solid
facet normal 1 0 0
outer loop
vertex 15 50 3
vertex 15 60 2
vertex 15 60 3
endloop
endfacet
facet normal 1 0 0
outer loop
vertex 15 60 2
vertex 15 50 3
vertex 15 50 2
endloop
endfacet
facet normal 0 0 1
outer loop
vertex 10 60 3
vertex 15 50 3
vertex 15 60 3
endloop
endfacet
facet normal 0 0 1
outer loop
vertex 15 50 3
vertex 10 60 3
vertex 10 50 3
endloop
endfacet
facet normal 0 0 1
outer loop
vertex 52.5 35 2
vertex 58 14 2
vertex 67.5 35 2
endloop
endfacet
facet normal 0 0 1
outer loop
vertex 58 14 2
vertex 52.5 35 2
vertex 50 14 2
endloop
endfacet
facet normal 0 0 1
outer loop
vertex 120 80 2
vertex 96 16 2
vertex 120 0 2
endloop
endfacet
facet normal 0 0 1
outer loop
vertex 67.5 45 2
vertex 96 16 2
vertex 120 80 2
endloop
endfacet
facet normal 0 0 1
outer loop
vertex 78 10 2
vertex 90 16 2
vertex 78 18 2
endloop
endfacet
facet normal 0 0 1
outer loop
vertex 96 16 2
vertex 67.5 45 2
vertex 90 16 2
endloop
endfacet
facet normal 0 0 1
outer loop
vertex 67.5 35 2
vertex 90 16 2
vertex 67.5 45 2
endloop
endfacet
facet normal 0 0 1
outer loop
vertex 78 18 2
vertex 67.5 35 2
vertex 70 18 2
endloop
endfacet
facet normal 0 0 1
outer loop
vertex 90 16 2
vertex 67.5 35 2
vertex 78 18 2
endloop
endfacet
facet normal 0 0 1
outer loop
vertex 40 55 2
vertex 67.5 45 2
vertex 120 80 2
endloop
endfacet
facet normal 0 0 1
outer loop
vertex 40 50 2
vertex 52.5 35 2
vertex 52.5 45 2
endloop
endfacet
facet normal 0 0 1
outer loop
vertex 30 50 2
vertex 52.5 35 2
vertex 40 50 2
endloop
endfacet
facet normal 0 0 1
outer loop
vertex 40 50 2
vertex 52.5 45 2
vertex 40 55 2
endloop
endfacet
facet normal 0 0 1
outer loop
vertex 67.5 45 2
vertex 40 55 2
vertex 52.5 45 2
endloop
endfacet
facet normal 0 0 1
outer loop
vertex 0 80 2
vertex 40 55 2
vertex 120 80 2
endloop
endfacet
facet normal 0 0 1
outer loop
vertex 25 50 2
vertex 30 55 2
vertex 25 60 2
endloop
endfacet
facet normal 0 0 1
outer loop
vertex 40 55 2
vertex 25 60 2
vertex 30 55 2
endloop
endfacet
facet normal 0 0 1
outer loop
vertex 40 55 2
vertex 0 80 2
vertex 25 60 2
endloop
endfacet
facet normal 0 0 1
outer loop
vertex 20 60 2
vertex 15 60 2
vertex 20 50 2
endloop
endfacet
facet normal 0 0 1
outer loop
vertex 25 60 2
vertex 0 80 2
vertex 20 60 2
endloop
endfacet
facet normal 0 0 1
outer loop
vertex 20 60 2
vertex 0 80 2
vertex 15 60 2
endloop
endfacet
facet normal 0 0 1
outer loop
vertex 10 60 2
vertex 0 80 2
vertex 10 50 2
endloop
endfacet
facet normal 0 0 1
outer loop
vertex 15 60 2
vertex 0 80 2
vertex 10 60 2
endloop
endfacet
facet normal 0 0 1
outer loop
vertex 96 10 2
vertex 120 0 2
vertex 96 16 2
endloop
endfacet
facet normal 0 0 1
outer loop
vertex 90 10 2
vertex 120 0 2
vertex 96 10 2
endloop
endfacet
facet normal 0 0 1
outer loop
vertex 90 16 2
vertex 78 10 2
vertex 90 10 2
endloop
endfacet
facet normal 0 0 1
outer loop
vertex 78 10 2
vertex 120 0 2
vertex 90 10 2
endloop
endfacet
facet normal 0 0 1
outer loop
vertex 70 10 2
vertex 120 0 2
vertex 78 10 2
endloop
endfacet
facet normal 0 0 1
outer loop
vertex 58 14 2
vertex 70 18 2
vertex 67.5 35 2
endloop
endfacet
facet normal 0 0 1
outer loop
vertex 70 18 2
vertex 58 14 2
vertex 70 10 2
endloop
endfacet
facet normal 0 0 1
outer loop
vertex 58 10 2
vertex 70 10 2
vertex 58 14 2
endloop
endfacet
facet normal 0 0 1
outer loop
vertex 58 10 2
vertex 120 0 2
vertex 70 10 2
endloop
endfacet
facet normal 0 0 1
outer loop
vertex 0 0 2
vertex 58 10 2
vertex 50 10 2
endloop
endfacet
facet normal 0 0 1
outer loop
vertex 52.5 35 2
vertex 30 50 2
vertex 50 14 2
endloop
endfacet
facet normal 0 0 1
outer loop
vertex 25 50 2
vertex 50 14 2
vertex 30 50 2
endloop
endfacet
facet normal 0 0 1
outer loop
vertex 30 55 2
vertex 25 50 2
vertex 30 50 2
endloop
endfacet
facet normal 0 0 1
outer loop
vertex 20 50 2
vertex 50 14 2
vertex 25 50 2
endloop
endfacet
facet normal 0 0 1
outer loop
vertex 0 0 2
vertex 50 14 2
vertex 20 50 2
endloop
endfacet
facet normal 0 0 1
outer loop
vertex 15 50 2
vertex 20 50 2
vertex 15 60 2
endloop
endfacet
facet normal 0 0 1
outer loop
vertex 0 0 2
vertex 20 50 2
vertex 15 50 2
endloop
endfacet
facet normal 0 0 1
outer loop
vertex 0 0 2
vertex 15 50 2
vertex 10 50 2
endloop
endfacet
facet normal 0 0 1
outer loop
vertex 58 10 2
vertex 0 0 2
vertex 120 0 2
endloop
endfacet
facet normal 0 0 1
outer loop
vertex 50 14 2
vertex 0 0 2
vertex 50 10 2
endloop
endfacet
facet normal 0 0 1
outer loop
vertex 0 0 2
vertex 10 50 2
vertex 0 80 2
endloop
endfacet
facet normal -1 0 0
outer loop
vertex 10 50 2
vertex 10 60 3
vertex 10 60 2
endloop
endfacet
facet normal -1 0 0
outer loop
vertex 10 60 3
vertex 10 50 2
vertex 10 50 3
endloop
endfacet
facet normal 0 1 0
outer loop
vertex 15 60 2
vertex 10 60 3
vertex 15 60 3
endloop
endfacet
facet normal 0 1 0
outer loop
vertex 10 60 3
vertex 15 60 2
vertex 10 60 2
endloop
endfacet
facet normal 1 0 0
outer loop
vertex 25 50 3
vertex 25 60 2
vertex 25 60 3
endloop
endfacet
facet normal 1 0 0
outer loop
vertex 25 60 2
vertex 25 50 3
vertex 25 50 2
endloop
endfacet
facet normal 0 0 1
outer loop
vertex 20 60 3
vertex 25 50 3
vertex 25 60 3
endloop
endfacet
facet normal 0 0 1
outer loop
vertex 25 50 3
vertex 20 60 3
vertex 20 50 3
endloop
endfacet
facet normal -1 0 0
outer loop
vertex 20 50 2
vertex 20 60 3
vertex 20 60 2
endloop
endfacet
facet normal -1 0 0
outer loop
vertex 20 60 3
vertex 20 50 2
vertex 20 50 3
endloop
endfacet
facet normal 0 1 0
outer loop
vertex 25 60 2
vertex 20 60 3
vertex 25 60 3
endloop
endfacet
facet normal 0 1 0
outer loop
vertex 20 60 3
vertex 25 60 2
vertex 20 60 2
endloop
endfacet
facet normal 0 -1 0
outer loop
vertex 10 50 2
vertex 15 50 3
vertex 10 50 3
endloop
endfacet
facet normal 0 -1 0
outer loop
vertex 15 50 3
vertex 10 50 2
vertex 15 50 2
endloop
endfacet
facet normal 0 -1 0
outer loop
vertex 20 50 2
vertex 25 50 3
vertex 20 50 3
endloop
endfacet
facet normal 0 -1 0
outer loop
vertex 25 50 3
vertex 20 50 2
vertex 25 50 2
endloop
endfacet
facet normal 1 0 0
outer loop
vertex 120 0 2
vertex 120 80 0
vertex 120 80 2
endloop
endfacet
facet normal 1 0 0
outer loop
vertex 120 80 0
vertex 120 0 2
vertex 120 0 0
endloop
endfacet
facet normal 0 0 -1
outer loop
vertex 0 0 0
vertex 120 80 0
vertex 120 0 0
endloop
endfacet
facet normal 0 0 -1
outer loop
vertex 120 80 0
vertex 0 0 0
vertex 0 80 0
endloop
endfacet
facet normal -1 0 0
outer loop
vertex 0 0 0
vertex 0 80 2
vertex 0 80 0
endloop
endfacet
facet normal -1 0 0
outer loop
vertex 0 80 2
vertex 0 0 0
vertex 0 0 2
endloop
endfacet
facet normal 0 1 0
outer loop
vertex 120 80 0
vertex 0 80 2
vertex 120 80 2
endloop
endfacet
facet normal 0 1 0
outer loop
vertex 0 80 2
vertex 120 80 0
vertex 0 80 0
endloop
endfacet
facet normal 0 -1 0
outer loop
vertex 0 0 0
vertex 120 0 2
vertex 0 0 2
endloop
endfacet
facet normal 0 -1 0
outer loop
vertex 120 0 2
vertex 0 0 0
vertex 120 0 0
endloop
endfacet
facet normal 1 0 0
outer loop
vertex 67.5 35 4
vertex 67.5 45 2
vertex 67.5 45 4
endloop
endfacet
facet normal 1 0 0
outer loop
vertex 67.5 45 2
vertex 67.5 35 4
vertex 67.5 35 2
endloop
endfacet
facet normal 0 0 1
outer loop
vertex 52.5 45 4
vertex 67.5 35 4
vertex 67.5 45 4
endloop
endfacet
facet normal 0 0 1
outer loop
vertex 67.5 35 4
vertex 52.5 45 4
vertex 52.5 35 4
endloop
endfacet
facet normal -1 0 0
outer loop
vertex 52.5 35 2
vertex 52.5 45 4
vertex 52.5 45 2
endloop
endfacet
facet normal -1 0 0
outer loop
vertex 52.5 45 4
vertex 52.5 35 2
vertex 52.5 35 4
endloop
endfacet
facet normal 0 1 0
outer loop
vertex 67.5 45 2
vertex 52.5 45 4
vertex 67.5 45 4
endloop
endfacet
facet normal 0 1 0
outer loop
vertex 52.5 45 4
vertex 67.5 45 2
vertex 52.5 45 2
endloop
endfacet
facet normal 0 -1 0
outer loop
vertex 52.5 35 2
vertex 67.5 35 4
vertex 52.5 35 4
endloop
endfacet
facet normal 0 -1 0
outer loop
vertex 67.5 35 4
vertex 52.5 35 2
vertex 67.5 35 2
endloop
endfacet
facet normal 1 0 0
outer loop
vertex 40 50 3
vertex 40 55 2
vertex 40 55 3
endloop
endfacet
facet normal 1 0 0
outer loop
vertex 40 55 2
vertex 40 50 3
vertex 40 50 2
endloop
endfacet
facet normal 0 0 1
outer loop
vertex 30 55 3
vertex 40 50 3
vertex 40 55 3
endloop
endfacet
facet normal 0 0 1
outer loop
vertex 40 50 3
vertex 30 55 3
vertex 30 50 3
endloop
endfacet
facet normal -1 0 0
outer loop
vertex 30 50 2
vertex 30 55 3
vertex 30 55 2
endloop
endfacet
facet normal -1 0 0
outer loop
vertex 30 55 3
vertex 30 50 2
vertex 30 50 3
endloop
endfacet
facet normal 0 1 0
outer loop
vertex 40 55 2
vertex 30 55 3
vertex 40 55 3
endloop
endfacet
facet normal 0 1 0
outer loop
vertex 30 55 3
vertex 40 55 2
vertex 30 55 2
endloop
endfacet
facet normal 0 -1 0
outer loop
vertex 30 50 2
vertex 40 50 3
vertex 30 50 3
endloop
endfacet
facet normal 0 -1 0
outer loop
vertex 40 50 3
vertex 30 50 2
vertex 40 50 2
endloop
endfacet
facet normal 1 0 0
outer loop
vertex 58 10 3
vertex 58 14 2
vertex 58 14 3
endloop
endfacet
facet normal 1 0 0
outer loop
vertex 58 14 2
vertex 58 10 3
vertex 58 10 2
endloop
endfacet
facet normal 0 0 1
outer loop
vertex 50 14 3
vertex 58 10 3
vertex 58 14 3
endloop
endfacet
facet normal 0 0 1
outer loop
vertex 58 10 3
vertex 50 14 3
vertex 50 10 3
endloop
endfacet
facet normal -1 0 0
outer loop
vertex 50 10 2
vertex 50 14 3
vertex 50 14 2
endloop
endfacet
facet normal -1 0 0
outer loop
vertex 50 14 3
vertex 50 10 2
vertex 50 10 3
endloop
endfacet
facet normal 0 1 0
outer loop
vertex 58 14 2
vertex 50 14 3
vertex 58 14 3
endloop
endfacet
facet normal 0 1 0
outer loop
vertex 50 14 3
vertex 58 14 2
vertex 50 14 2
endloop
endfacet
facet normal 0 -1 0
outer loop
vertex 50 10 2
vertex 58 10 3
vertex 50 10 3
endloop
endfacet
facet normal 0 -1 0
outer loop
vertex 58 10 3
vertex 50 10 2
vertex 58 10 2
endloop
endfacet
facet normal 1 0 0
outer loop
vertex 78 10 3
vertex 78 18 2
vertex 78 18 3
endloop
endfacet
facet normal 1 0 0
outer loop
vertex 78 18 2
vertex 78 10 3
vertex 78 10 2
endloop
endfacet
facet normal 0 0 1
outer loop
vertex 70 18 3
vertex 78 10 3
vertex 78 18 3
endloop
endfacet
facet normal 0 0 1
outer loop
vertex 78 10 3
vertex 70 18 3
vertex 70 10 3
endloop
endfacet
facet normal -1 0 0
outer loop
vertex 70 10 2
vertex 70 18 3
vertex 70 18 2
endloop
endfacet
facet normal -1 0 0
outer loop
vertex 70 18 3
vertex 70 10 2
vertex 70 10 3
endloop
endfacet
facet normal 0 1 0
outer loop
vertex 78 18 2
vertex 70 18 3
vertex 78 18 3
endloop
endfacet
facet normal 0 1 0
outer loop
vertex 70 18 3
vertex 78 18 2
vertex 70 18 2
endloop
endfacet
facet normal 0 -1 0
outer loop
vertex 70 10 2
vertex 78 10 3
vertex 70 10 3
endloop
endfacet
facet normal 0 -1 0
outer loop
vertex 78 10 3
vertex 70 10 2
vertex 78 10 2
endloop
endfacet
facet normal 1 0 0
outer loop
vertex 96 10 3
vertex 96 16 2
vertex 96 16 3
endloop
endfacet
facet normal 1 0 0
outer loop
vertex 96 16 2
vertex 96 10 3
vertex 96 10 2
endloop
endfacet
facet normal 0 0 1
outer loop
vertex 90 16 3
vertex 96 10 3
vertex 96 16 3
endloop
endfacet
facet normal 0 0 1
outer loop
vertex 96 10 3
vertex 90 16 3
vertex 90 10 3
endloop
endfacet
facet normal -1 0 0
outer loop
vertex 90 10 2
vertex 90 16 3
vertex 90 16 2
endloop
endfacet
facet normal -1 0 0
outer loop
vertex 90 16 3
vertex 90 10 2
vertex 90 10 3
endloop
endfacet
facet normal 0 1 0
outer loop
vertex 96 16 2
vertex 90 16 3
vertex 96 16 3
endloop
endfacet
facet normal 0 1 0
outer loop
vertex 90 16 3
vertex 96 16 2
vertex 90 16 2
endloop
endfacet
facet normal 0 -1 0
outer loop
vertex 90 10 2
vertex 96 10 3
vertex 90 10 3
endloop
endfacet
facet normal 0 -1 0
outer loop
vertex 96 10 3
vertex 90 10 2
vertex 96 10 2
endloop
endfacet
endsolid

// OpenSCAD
// Generated by SolidPython 1.1.3 on 2025-02-13 18:15:41
$fn = 50;


union() {
	cube(size = [120, 80, 2]);
	translate(v = [52.5000000000, 35.0000000000, 2]) {
		cube(size = [15, 10, 2]);
	}
	translate(v = [10, 50, 2]) {
		union() {
			difference() {
				union() {
					translate(v = [0, 5, 0]) {
						cube(size = [5, 5, 1]);
					}
					translate(v = [10, 5, 0]) {
						cube(size = [5, 5, 1]);
					}
					translate(v = [0, 0, 0]) {
						cube(size = [5, 5, 1]);
					}
					translate(v = [10, 0, 0]) {
						cube(size = [5, 5, 1]);
					}
				}
				translate(v = [10, 0, 0]) {
					cube(size = [5, 5, 1]);
				}
			}
			translate(v = [10, 0, 0]) {
				color(alpha = 1.0000000000, c = "red") {
					cube(size = [5, 5, 1]);
				}
			}
		}
	}
	translate(v = [30, 50, 2]) {
		cube(size = [10, 5, 1]);
	}
	translate(v = [50, 10, 2]) {
		cube(size = [8, 4, 1]);
	}
	translate(v = [70, 10, 2]) {
		cube(size = [8, 8, 1]);
	}
	translate(v = [90, 10, 2]) {
		cube(size = [6, 6, 1]);
	}
}
/***********************************************
*********      SolidPython code:      **********
************************************************
 
from solid import *
from solid.utils import *

# ------------------------------------------------------------------------------
# Board Parameters (in millimeters)
# ------------------------------------------------------------------------------
board_length = 120
board_width = 80
board_thickness = 2

# Create the PCB as a simple rectangular plate
pcb = cube([board_length, board_width, board_thickness])

# ------------------------------------------------------------------------------
# Component Blocks
# ------------------------------------------------------------------------------

# 1. Microchip Block (instead of a full microcontroller, we show a generic microchip)
# Dimensions: 15 x 10 x 2 mm
microchip = cube([15, 10, 2])
# Place the microchip near the center of the board (on top surface)
microchip = translate([(board_length - 15) / 2, (board_width - 10) / 2, board_thickness])(microchip)

# 2. Wheatstone Bridge (for the strain gauge)
# We simulate this with four small resistor blocks arranged in a diamond.
# Each resistor is 5 x 5 x 1 mm.
resistor = cube([5, 5, 1])
# Build the bridge by placing four resistors in a 2x2 grid:
bridge_origin = [10, 50, board_thickness]  # starting position on the board
resistor1 = translate([0, 5, 0])(resistor)  # top left
resistor2 = translate([10, 5, 0])(resistor) # top right
resistor3 = translate([0, 0, 0])(resistor)   # bottom left
resistor4 = translate([10, 0, 0])(resistor)  # bottom right
bridge = union()(resistor1, resistor2, resistor3, resistor4)

# Replace one resistor with a strain gauge block (different color to indicate function)
# We'll replace the bottom right resistor with a red block.
strain_gauge_block = color("red")(cube([5, 5, 1]))
bridge = difference()(
    bridge,
    translate([10, 0, 0])(resistor)  # remove the bottom right resistor
)
bridge = union()(
    bridge,
    translate([10, 0, 0])(strain_gauge_block)
)
# Place the Wheatstone bridge on the board.
bridge = translate(bridge_origin)(bridge)

# 3. Instrumentation Amplifier (AD620) Block
# Dimensions: 10 x 5 x 1 mm
amp = cube([10, 5, 1])
amp = translate([30, 50, board_thickness])(amp)

# 4. Temperature Sensor (LM35) Block
# Dimensions: 8 x 4 x 1 mm
temp_sensor = cube([8, 4, 1])
temp_sensor = translate([50, 10, board_thickness])(temp_sensor)

# 5. Vibration Sensor (ADXL335 or MPU6050) Block
# Dimensions: 8 x 8 x 1 mm
vibration_sensor = cube([8, 8, 1])
vibration_sensor = translate([70, 10, board_thickness])(vibration_sensor)

# 6. Humidity Sensor (DHT22) Block
# Dimensions: 6 x 6 x 1 mm
humidity_sensor = cube([6, 6, 1])
humidity_sensor = translate([90, 10, board_thickness])(humidity_sensor)

# ------------------------------------------------------------------------------
# Combine all components onto the PCB
# ------------------------------------------------------------------------------
sensor_module = pcb + microchip + bridge + amp + temp_sensor + vibration_sensor + humidity_sensor

# ------------------------------------------------------------------------------
# Export the model to a SCAD file (use OpenSCAD to render and export as STL)
# ------------------------------------------------------------------------------
scad_render_to_file(sensor_module, 'sensor_module_prototype.scad', file_header='$fn = 50;')
 
 
************************************************/
